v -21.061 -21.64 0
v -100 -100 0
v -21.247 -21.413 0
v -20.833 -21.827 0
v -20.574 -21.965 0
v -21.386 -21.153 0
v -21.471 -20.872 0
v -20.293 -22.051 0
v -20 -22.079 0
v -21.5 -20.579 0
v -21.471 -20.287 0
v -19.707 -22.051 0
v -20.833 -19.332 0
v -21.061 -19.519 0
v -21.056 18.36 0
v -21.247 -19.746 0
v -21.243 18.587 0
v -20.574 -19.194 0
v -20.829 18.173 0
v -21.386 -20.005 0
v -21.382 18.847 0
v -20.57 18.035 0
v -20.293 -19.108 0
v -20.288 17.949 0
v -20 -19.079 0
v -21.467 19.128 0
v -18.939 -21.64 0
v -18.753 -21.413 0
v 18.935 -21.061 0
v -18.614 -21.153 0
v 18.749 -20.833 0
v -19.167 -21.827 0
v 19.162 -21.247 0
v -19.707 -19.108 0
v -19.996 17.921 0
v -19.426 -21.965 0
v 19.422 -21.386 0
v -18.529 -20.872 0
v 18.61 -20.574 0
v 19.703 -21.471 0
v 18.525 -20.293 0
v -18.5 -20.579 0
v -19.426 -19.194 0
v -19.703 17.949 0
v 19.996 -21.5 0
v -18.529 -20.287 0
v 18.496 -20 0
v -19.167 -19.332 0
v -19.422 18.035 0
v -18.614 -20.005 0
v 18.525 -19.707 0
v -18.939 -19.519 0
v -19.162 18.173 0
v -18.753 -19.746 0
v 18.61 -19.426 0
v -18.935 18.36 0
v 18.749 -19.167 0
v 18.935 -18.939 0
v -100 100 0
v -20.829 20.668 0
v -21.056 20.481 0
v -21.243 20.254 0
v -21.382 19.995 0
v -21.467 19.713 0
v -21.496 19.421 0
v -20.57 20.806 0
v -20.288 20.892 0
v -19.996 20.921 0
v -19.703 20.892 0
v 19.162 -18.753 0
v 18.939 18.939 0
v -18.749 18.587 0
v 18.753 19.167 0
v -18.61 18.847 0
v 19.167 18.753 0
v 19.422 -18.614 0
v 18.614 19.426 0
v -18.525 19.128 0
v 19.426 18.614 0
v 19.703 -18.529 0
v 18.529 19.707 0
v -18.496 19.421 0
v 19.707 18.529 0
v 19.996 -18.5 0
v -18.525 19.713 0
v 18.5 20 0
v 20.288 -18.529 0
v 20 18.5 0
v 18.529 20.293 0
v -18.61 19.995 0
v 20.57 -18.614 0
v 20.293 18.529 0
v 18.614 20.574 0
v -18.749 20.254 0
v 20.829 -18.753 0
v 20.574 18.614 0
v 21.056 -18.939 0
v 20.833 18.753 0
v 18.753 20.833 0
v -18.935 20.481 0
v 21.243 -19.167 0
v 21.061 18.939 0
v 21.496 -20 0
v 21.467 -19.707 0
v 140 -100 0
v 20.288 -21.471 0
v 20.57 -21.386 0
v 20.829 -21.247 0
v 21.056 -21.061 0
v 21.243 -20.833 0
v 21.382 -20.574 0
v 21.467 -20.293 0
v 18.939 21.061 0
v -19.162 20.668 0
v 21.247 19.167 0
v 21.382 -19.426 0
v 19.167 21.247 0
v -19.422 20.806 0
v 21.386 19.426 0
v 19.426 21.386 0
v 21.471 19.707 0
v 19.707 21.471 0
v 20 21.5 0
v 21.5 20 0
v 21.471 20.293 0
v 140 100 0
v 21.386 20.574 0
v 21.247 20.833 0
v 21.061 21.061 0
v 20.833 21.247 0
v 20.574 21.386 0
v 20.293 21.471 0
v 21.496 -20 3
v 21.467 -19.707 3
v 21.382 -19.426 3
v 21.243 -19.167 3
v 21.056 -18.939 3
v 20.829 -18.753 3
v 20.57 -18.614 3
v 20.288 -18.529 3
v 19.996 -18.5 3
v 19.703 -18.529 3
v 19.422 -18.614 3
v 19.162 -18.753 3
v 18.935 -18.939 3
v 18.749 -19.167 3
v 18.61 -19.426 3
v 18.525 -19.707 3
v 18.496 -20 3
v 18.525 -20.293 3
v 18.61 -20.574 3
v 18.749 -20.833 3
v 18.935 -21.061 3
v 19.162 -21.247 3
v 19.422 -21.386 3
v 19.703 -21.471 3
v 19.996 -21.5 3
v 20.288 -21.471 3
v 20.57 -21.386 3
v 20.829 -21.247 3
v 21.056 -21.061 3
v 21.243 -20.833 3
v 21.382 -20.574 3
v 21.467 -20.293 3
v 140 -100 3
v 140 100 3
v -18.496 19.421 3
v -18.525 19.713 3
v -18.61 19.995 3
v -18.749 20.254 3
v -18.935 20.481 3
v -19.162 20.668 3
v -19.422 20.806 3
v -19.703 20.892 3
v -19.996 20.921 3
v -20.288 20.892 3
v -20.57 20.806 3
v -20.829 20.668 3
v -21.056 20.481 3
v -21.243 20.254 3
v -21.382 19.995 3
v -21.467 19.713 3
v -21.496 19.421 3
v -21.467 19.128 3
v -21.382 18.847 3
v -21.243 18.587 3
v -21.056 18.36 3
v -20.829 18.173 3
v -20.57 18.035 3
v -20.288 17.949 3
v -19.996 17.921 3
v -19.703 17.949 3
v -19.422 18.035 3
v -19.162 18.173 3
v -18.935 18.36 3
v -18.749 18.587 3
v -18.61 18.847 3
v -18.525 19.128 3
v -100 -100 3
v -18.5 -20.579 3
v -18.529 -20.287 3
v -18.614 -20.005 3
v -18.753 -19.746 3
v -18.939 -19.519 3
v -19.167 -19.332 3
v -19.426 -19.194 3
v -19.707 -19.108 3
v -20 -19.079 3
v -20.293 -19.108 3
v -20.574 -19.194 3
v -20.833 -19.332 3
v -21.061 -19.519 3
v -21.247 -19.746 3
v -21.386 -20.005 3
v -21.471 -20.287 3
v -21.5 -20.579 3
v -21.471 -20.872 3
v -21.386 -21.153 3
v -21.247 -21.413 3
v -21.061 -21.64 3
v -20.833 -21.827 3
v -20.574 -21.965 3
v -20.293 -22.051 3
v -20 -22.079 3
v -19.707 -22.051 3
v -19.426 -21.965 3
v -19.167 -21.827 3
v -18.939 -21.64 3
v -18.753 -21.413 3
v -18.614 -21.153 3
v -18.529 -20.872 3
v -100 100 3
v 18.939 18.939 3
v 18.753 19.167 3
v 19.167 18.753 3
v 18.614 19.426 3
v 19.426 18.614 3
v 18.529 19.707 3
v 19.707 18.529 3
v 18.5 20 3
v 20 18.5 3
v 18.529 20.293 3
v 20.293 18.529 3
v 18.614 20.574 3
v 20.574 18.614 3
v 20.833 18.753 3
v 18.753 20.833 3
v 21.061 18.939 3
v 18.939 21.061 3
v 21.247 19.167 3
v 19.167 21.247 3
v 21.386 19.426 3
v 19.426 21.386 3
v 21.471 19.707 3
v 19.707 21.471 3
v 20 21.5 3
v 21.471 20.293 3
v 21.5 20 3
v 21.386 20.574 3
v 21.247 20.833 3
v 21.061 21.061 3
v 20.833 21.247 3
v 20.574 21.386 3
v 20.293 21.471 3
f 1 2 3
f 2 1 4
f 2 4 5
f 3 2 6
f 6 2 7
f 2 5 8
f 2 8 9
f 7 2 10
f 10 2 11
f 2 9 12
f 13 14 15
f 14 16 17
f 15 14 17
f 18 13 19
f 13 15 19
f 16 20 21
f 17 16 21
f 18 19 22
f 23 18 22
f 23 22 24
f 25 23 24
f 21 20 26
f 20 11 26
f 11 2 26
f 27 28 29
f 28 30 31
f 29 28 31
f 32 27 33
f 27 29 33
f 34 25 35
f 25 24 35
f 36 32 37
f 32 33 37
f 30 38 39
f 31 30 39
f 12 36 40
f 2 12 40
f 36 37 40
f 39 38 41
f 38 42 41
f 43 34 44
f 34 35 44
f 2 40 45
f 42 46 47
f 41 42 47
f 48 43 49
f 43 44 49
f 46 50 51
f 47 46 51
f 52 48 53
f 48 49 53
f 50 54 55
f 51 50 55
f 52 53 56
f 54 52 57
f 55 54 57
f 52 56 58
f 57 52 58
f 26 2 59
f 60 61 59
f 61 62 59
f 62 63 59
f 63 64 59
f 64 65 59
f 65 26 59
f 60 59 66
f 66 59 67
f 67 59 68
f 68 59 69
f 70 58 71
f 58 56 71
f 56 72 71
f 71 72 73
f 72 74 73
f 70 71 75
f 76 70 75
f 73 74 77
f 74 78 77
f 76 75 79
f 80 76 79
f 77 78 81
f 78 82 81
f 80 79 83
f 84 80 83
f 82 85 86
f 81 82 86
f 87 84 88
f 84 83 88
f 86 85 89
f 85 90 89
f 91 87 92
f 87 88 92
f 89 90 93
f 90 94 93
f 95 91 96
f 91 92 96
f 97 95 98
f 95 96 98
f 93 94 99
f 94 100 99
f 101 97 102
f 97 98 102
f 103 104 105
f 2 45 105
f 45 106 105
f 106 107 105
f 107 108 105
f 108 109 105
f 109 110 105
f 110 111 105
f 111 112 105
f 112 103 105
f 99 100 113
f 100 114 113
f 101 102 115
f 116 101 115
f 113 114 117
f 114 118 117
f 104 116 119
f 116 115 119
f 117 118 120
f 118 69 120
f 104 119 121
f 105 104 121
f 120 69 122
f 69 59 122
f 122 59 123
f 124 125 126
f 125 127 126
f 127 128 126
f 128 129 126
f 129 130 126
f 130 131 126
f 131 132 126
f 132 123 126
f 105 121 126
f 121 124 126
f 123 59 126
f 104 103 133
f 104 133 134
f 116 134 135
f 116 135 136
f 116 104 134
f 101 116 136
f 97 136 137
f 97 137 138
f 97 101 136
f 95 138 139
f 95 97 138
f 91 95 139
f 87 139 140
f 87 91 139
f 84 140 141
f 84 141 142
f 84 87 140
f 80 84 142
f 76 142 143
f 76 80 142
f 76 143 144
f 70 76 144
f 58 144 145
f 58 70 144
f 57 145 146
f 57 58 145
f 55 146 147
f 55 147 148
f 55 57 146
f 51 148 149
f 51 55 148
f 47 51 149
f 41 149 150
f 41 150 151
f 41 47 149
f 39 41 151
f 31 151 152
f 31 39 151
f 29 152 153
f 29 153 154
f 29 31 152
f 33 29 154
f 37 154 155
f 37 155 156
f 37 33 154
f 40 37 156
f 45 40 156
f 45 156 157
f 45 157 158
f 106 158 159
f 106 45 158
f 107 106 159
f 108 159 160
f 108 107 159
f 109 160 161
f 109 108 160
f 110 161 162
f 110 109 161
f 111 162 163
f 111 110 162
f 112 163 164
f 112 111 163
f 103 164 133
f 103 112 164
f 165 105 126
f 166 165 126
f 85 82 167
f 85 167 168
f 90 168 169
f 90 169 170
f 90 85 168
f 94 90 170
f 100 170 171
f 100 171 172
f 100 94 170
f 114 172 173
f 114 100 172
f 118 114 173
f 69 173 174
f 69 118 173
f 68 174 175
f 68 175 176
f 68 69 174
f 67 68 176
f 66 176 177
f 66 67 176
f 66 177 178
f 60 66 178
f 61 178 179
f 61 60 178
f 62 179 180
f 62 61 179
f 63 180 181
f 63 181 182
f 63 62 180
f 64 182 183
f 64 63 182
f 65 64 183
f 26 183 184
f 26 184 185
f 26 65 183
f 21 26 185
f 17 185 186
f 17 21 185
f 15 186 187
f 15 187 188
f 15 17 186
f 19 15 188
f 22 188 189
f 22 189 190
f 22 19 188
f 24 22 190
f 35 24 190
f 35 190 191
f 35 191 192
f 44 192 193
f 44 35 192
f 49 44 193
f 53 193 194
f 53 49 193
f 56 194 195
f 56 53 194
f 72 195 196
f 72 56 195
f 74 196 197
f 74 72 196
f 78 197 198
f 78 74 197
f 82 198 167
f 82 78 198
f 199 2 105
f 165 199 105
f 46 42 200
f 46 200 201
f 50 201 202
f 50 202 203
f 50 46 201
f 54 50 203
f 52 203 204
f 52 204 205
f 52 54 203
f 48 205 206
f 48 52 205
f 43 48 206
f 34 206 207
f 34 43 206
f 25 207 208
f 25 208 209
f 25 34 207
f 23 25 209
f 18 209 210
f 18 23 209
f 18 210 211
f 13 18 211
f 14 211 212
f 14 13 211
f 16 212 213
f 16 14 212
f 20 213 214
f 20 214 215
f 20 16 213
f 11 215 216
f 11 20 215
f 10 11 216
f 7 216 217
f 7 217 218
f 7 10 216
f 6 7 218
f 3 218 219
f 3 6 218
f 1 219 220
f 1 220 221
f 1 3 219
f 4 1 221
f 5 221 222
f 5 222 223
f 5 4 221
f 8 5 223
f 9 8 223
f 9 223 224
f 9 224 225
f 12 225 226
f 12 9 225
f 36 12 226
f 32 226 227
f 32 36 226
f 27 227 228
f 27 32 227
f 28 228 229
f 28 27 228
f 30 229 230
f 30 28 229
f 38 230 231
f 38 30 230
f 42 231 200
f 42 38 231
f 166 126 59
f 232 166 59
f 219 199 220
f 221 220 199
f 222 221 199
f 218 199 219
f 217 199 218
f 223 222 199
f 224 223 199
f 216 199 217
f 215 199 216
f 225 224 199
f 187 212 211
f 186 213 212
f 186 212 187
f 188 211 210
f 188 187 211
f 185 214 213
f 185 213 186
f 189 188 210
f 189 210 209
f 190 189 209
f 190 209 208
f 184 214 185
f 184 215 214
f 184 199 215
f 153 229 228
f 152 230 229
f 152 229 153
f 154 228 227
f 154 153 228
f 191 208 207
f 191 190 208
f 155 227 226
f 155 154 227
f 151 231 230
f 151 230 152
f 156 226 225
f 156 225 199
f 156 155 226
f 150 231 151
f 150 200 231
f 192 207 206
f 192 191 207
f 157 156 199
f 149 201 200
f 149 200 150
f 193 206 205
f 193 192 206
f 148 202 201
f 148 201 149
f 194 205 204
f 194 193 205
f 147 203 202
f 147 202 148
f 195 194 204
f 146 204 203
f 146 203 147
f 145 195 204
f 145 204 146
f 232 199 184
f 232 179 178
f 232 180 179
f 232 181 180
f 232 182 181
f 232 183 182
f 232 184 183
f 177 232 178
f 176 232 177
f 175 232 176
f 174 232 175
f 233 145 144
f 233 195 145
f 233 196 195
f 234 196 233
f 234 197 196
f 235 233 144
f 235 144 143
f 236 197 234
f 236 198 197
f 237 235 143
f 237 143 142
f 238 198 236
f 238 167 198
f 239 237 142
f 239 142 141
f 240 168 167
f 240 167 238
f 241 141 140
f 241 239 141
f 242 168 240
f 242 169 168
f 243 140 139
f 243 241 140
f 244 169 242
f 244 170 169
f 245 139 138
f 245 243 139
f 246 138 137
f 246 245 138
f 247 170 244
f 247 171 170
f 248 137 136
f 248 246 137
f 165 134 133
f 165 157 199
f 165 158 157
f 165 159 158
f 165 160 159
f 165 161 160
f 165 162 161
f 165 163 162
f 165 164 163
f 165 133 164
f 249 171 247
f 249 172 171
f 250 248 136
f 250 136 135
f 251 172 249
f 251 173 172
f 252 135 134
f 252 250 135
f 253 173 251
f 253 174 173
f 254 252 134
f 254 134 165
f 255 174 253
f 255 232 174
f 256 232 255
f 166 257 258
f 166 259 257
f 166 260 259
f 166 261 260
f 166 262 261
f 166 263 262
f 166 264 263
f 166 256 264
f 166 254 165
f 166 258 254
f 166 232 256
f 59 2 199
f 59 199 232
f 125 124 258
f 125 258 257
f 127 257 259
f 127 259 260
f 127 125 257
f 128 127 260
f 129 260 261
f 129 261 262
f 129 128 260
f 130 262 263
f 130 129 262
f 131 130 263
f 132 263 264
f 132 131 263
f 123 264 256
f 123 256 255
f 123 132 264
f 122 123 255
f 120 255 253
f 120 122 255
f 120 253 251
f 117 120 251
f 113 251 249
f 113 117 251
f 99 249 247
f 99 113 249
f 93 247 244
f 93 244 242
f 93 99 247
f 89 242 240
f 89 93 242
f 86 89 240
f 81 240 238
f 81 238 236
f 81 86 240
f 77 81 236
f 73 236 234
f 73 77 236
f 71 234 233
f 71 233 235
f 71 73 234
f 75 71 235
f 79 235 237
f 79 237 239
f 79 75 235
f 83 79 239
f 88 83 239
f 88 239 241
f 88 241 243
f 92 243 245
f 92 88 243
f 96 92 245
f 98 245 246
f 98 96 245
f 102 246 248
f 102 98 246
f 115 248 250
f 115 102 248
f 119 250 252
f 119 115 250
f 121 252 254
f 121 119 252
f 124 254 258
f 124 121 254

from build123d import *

# Parameters (mm, degrees)
F0_W     = 200
F0_H     = 200
F0_R     = 1.5
F0_W_2   = 40
F1_DEPTH = 3


with BuildPart() as f1:
    # F0 (on Top) → F1 (new body)
    with BuildSketch(Plane.XY):
        Rectangle(F0_W, F0_H)
        with Locations((-20, -20.579408)):
            Circle(F0_R, mode=Mode.SUBTRACT)
        with Locations((19.995803, -20)):
            Circle(F0_R, mode=Mode.SUBTRACT)
        with Locations((-19.995803, 19.420592)):
            Circle(F0_R, mode=Mode.SUBTRACT)
        with Locations((20, 20)):
            Circle(F0_R, mode=Mode.SUBTRACT)
        with Locations((120, 0)):
            Rectangle(F0_W_2, F0_H)
    extrude(amount=F1_DEPTH)


solid = f1.part
